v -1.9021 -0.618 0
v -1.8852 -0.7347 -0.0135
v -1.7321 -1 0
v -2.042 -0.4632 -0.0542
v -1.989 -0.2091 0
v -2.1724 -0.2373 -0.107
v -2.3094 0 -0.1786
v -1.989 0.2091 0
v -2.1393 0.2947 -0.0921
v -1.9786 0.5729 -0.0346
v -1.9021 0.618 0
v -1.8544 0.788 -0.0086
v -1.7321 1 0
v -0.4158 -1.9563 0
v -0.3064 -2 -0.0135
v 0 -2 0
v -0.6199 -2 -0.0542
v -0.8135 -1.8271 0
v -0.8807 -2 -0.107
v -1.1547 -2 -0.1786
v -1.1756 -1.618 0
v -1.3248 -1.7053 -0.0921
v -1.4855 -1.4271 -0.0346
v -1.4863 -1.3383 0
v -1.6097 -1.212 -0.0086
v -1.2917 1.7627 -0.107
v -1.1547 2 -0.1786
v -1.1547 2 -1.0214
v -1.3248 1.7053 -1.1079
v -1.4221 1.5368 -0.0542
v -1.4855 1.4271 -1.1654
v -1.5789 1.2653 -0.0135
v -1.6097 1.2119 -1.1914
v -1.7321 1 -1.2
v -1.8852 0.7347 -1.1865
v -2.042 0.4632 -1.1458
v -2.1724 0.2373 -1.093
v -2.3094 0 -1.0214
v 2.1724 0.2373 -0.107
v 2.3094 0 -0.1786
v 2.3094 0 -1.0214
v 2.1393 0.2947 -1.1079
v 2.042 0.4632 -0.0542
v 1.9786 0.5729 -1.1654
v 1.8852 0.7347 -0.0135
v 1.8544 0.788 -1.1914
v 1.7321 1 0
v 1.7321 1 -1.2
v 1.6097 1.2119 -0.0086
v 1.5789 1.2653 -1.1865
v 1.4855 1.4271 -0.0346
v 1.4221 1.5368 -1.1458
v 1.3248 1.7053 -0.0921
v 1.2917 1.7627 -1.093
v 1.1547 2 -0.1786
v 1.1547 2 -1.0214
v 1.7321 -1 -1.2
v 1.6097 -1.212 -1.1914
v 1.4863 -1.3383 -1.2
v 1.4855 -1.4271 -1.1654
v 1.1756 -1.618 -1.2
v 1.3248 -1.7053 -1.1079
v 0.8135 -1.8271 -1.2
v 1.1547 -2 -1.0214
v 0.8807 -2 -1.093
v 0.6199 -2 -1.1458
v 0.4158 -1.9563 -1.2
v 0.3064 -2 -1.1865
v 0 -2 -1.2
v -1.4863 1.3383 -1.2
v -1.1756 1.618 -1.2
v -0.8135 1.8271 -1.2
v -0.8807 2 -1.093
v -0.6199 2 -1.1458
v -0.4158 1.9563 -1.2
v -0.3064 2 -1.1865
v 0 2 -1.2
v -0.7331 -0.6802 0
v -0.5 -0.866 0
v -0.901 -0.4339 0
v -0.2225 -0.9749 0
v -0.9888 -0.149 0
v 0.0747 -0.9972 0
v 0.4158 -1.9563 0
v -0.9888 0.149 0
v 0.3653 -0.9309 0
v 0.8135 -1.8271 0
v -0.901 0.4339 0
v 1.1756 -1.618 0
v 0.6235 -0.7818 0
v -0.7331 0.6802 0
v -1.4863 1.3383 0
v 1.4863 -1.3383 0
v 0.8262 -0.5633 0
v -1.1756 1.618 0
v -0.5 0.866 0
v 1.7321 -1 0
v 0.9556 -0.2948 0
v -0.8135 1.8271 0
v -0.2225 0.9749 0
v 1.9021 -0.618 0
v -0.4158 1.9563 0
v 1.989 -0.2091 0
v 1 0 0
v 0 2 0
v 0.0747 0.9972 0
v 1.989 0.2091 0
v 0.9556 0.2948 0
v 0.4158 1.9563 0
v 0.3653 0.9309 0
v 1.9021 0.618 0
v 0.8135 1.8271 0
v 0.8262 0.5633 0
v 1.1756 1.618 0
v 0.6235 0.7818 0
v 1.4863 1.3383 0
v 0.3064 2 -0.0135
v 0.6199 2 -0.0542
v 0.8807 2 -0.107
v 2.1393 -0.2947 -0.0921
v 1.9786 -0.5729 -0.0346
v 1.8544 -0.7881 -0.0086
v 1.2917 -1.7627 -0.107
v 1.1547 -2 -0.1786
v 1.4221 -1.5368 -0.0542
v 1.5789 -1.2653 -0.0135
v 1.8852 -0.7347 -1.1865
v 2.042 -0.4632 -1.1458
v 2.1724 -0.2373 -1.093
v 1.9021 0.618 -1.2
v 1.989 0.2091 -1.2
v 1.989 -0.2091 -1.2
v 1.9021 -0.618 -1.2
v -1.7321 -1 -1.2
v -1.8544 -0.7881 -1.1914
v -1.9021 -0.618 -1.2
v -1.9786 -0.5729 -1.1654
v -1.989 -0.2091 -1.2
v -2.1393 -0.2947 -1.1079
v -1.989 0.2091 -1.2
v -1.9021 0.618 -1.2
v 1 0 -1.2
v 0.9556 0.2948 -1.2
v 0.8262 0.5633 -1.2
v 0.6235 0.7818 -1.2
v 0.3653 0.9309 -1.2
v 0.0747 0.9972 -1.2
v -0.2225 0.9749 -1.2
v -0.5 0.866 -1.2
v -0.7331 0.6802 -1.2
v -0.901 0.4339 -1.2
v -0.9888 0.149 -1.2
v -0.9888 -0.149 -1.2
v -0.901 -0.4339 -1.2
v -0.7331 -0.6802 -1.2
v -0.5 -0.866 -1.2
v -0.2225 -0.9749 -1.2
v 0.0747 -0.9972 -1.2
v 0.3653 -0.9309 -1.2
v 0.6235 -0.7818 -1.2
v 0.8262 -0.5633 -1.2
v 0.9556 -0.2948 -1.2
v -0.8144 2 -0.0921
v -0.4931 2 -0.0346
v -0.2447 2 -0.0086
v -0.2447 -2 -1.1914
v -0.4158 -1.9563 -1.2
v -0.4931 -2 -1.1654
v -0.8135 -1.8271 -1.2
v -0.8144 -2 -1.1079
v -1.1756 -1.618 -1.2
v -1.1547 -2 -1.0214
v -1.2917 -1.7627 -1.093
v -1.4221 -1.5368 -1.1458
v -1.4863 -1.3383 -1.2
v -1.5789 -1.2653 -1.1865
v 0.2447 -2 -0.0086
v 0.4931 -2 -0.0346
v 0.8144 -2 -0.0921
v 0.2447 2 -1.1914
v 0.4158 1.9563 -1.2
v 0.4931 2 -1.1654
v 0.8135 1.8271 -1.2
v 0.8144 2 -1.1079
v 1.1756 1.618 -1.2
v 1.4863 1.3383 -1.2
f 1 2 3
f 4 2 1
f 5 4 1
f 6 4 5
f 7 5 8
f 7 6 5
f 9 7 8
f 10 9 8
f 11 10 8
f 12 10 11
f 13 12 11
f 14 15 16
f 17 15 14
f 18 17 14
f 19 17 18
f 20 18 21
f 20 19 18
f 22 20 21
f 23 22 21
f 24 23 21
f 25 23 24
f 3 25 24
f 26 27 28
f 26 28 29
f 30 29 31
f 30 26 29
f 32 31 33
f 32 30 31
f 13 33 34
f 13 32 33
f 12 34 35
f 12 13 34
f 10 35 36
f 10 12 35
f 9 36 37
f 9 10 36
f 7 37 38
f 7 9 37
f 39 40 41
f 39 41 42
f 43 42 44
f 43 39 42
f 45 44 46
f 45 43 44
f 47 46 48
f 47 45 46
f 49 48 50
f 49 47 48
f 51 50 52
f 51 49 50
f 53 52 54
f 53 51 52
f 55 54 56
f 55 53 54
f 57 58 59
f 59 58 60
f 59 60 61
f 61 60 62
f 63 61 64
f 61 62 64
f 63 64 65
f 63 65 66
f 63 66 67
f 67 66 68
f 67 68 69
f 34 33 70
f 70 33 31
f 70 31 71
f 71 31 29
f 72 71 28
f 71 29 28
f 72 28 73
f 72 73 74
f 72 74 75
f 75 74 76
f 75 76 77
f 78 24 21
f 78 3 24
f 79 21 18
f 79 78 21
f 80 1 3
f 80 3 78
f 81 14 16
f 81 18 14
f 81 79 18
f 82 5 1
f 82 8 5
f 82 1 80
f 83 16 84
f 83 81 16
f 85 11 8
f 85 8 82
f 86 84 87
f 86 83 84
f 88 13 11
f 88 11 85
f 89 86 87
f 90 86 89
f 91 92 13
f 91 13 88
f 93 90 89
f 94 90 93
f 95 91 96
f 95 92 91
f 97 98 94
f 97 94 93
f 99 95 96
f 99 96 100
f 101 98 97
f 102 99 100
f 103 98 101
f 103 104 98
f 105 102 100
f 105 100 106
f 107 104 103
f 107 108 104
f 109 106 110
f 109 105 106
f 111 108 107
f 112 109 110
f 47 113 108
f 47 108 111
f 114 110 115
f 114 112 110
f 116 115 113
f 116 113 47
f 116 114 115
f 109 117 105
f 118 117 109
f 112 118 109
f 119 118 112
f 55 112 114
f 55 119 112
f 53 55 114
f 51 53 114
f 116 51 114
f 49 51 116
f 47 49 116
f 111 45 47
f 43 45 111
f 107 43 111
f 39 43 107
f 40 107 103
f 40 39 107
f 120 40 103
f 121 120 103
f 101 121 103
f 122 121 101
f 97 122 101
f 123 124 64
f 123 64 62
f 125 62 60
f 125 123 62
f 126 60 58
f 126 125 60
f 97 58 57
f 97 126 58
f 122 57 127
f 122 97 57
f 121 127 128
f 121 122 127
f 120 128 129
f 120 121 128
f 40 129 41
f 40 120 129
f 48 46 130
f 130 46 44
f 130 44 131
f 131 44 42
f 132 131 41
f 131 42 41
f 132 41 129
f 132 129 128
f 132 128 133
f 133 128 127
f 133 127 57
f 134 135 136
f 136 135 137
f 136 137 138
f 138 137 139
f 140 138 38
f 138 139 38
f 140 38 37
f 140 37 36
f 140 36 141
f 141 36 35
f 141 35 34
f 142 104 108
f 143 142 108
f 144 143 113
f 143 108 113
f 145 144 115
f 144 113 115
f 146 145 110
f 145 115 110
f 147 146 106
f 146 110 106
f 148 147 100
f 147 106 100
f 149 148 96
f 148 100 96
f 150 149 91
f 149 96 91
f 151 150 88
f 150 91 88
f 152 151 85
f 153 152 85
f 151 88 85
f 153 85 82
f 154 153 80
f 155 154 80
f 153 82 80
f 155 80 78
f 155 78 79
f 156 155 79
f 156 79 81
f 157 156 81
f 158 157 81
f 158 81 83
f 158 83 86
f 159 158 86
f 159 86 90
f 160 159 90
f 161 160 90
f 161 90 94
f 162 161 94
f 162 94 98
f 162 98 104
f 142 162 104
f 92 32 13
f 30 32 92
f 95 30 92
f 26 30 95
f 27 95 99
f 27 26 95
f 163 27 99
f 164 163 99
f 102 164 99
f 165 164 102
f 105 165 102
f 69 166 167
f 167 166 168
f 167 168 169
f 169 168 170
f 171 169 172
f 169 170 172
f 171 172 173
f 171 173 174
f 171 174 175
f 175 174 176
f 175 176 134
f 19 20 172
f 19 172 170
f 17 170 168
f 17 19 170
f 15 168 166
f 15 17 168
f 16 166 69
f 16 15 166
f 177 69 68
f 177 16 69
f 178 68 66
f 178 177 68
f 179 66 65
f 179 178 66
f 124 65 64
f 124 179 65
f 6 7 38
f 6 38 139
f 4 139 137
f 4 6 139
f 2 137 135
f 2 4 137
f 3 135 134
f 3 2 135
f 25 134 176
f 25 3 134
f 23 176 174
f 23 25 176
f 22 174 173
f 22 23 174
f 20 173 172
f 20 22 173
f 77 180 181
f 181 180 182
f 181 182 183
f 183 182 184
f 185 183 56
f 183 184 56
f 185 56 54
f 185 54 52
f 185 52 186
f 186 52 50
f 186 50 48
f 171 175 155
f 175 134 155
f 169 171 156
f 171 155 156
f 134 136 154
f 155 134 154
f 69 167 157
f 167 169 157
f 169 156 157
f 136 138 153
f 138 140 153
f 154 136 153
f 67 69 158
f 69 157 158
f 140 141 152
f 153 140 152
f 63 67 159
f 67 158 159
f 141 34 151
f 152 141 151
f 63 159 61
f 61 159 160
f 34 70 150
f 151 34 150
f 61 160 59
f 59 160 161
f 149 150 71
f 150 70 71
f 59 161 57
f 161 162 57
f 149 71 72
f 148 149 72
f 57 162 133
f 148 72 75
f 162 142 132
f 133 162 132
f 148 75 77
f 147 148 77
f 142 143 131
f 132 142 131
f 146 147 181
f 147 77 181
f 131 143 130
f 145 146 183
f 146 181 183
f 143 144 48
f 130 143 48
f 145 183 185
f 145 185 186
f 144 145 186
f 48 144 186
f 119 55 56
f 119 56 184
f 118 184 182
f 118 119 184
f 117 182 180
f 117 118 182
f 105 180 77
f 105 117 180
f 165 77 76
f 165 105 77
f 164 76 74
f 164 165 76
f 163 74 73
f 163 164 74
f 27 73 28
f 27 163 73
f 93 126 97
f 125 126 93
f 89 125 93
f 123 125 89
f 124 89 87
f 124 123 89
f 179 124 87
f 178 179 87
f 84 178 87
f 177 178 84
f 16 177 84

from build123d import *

# Parameters (mm, degrees)
HEX_2_DEPTH          = 1.2
THREAD_BORESKETCH4_R = 1
THREAD_BORE_DEPTH    = 2.2


with BuildPart() as part:
    # HexSketch1 → Hex 2 (new body)
    with BuildSketch(Plane.XY):
        Polygon((1.154700538, 2), (-1.154700538, 2), (-2.309401077, 0), (-1.154700538, -2), (1.154700538, -2), (2.309401077, 0), align=None)
    extrude(amount=-HEX_2_DEPTH)

    # Thread_BoreSketch4 → Thread_Bore (cut, through all)
    with BuildSketch(Plane.XY):
        Circle(THREAD_BORESKETCH4_R)
    extrude(amount=-THREAD_BORE_DEPTH, mode=Mode.SUBTRACT)

    # NUT_CHAMFERSketch10 → NUT_CHAMFER (revolve, cut)
    with BuildSketch(Plane(origin=(0, 0, 0), x_dir=(0, 0, -1), z_dir=(0.866025404, 0.5, 0))):
        Polygon((0, 2), (0.178632795, 2.309401077), (0, 2.309401077), align=None)
        Polygon((1.2, 2), (1.021367205, 2.309401077), (1.2, 2.309401077), align=None)
    revolve(axis=Axis((0, 0, 50), (0, 0, -1)), mode=Mode.SUBTRACT)


solid = part.part
